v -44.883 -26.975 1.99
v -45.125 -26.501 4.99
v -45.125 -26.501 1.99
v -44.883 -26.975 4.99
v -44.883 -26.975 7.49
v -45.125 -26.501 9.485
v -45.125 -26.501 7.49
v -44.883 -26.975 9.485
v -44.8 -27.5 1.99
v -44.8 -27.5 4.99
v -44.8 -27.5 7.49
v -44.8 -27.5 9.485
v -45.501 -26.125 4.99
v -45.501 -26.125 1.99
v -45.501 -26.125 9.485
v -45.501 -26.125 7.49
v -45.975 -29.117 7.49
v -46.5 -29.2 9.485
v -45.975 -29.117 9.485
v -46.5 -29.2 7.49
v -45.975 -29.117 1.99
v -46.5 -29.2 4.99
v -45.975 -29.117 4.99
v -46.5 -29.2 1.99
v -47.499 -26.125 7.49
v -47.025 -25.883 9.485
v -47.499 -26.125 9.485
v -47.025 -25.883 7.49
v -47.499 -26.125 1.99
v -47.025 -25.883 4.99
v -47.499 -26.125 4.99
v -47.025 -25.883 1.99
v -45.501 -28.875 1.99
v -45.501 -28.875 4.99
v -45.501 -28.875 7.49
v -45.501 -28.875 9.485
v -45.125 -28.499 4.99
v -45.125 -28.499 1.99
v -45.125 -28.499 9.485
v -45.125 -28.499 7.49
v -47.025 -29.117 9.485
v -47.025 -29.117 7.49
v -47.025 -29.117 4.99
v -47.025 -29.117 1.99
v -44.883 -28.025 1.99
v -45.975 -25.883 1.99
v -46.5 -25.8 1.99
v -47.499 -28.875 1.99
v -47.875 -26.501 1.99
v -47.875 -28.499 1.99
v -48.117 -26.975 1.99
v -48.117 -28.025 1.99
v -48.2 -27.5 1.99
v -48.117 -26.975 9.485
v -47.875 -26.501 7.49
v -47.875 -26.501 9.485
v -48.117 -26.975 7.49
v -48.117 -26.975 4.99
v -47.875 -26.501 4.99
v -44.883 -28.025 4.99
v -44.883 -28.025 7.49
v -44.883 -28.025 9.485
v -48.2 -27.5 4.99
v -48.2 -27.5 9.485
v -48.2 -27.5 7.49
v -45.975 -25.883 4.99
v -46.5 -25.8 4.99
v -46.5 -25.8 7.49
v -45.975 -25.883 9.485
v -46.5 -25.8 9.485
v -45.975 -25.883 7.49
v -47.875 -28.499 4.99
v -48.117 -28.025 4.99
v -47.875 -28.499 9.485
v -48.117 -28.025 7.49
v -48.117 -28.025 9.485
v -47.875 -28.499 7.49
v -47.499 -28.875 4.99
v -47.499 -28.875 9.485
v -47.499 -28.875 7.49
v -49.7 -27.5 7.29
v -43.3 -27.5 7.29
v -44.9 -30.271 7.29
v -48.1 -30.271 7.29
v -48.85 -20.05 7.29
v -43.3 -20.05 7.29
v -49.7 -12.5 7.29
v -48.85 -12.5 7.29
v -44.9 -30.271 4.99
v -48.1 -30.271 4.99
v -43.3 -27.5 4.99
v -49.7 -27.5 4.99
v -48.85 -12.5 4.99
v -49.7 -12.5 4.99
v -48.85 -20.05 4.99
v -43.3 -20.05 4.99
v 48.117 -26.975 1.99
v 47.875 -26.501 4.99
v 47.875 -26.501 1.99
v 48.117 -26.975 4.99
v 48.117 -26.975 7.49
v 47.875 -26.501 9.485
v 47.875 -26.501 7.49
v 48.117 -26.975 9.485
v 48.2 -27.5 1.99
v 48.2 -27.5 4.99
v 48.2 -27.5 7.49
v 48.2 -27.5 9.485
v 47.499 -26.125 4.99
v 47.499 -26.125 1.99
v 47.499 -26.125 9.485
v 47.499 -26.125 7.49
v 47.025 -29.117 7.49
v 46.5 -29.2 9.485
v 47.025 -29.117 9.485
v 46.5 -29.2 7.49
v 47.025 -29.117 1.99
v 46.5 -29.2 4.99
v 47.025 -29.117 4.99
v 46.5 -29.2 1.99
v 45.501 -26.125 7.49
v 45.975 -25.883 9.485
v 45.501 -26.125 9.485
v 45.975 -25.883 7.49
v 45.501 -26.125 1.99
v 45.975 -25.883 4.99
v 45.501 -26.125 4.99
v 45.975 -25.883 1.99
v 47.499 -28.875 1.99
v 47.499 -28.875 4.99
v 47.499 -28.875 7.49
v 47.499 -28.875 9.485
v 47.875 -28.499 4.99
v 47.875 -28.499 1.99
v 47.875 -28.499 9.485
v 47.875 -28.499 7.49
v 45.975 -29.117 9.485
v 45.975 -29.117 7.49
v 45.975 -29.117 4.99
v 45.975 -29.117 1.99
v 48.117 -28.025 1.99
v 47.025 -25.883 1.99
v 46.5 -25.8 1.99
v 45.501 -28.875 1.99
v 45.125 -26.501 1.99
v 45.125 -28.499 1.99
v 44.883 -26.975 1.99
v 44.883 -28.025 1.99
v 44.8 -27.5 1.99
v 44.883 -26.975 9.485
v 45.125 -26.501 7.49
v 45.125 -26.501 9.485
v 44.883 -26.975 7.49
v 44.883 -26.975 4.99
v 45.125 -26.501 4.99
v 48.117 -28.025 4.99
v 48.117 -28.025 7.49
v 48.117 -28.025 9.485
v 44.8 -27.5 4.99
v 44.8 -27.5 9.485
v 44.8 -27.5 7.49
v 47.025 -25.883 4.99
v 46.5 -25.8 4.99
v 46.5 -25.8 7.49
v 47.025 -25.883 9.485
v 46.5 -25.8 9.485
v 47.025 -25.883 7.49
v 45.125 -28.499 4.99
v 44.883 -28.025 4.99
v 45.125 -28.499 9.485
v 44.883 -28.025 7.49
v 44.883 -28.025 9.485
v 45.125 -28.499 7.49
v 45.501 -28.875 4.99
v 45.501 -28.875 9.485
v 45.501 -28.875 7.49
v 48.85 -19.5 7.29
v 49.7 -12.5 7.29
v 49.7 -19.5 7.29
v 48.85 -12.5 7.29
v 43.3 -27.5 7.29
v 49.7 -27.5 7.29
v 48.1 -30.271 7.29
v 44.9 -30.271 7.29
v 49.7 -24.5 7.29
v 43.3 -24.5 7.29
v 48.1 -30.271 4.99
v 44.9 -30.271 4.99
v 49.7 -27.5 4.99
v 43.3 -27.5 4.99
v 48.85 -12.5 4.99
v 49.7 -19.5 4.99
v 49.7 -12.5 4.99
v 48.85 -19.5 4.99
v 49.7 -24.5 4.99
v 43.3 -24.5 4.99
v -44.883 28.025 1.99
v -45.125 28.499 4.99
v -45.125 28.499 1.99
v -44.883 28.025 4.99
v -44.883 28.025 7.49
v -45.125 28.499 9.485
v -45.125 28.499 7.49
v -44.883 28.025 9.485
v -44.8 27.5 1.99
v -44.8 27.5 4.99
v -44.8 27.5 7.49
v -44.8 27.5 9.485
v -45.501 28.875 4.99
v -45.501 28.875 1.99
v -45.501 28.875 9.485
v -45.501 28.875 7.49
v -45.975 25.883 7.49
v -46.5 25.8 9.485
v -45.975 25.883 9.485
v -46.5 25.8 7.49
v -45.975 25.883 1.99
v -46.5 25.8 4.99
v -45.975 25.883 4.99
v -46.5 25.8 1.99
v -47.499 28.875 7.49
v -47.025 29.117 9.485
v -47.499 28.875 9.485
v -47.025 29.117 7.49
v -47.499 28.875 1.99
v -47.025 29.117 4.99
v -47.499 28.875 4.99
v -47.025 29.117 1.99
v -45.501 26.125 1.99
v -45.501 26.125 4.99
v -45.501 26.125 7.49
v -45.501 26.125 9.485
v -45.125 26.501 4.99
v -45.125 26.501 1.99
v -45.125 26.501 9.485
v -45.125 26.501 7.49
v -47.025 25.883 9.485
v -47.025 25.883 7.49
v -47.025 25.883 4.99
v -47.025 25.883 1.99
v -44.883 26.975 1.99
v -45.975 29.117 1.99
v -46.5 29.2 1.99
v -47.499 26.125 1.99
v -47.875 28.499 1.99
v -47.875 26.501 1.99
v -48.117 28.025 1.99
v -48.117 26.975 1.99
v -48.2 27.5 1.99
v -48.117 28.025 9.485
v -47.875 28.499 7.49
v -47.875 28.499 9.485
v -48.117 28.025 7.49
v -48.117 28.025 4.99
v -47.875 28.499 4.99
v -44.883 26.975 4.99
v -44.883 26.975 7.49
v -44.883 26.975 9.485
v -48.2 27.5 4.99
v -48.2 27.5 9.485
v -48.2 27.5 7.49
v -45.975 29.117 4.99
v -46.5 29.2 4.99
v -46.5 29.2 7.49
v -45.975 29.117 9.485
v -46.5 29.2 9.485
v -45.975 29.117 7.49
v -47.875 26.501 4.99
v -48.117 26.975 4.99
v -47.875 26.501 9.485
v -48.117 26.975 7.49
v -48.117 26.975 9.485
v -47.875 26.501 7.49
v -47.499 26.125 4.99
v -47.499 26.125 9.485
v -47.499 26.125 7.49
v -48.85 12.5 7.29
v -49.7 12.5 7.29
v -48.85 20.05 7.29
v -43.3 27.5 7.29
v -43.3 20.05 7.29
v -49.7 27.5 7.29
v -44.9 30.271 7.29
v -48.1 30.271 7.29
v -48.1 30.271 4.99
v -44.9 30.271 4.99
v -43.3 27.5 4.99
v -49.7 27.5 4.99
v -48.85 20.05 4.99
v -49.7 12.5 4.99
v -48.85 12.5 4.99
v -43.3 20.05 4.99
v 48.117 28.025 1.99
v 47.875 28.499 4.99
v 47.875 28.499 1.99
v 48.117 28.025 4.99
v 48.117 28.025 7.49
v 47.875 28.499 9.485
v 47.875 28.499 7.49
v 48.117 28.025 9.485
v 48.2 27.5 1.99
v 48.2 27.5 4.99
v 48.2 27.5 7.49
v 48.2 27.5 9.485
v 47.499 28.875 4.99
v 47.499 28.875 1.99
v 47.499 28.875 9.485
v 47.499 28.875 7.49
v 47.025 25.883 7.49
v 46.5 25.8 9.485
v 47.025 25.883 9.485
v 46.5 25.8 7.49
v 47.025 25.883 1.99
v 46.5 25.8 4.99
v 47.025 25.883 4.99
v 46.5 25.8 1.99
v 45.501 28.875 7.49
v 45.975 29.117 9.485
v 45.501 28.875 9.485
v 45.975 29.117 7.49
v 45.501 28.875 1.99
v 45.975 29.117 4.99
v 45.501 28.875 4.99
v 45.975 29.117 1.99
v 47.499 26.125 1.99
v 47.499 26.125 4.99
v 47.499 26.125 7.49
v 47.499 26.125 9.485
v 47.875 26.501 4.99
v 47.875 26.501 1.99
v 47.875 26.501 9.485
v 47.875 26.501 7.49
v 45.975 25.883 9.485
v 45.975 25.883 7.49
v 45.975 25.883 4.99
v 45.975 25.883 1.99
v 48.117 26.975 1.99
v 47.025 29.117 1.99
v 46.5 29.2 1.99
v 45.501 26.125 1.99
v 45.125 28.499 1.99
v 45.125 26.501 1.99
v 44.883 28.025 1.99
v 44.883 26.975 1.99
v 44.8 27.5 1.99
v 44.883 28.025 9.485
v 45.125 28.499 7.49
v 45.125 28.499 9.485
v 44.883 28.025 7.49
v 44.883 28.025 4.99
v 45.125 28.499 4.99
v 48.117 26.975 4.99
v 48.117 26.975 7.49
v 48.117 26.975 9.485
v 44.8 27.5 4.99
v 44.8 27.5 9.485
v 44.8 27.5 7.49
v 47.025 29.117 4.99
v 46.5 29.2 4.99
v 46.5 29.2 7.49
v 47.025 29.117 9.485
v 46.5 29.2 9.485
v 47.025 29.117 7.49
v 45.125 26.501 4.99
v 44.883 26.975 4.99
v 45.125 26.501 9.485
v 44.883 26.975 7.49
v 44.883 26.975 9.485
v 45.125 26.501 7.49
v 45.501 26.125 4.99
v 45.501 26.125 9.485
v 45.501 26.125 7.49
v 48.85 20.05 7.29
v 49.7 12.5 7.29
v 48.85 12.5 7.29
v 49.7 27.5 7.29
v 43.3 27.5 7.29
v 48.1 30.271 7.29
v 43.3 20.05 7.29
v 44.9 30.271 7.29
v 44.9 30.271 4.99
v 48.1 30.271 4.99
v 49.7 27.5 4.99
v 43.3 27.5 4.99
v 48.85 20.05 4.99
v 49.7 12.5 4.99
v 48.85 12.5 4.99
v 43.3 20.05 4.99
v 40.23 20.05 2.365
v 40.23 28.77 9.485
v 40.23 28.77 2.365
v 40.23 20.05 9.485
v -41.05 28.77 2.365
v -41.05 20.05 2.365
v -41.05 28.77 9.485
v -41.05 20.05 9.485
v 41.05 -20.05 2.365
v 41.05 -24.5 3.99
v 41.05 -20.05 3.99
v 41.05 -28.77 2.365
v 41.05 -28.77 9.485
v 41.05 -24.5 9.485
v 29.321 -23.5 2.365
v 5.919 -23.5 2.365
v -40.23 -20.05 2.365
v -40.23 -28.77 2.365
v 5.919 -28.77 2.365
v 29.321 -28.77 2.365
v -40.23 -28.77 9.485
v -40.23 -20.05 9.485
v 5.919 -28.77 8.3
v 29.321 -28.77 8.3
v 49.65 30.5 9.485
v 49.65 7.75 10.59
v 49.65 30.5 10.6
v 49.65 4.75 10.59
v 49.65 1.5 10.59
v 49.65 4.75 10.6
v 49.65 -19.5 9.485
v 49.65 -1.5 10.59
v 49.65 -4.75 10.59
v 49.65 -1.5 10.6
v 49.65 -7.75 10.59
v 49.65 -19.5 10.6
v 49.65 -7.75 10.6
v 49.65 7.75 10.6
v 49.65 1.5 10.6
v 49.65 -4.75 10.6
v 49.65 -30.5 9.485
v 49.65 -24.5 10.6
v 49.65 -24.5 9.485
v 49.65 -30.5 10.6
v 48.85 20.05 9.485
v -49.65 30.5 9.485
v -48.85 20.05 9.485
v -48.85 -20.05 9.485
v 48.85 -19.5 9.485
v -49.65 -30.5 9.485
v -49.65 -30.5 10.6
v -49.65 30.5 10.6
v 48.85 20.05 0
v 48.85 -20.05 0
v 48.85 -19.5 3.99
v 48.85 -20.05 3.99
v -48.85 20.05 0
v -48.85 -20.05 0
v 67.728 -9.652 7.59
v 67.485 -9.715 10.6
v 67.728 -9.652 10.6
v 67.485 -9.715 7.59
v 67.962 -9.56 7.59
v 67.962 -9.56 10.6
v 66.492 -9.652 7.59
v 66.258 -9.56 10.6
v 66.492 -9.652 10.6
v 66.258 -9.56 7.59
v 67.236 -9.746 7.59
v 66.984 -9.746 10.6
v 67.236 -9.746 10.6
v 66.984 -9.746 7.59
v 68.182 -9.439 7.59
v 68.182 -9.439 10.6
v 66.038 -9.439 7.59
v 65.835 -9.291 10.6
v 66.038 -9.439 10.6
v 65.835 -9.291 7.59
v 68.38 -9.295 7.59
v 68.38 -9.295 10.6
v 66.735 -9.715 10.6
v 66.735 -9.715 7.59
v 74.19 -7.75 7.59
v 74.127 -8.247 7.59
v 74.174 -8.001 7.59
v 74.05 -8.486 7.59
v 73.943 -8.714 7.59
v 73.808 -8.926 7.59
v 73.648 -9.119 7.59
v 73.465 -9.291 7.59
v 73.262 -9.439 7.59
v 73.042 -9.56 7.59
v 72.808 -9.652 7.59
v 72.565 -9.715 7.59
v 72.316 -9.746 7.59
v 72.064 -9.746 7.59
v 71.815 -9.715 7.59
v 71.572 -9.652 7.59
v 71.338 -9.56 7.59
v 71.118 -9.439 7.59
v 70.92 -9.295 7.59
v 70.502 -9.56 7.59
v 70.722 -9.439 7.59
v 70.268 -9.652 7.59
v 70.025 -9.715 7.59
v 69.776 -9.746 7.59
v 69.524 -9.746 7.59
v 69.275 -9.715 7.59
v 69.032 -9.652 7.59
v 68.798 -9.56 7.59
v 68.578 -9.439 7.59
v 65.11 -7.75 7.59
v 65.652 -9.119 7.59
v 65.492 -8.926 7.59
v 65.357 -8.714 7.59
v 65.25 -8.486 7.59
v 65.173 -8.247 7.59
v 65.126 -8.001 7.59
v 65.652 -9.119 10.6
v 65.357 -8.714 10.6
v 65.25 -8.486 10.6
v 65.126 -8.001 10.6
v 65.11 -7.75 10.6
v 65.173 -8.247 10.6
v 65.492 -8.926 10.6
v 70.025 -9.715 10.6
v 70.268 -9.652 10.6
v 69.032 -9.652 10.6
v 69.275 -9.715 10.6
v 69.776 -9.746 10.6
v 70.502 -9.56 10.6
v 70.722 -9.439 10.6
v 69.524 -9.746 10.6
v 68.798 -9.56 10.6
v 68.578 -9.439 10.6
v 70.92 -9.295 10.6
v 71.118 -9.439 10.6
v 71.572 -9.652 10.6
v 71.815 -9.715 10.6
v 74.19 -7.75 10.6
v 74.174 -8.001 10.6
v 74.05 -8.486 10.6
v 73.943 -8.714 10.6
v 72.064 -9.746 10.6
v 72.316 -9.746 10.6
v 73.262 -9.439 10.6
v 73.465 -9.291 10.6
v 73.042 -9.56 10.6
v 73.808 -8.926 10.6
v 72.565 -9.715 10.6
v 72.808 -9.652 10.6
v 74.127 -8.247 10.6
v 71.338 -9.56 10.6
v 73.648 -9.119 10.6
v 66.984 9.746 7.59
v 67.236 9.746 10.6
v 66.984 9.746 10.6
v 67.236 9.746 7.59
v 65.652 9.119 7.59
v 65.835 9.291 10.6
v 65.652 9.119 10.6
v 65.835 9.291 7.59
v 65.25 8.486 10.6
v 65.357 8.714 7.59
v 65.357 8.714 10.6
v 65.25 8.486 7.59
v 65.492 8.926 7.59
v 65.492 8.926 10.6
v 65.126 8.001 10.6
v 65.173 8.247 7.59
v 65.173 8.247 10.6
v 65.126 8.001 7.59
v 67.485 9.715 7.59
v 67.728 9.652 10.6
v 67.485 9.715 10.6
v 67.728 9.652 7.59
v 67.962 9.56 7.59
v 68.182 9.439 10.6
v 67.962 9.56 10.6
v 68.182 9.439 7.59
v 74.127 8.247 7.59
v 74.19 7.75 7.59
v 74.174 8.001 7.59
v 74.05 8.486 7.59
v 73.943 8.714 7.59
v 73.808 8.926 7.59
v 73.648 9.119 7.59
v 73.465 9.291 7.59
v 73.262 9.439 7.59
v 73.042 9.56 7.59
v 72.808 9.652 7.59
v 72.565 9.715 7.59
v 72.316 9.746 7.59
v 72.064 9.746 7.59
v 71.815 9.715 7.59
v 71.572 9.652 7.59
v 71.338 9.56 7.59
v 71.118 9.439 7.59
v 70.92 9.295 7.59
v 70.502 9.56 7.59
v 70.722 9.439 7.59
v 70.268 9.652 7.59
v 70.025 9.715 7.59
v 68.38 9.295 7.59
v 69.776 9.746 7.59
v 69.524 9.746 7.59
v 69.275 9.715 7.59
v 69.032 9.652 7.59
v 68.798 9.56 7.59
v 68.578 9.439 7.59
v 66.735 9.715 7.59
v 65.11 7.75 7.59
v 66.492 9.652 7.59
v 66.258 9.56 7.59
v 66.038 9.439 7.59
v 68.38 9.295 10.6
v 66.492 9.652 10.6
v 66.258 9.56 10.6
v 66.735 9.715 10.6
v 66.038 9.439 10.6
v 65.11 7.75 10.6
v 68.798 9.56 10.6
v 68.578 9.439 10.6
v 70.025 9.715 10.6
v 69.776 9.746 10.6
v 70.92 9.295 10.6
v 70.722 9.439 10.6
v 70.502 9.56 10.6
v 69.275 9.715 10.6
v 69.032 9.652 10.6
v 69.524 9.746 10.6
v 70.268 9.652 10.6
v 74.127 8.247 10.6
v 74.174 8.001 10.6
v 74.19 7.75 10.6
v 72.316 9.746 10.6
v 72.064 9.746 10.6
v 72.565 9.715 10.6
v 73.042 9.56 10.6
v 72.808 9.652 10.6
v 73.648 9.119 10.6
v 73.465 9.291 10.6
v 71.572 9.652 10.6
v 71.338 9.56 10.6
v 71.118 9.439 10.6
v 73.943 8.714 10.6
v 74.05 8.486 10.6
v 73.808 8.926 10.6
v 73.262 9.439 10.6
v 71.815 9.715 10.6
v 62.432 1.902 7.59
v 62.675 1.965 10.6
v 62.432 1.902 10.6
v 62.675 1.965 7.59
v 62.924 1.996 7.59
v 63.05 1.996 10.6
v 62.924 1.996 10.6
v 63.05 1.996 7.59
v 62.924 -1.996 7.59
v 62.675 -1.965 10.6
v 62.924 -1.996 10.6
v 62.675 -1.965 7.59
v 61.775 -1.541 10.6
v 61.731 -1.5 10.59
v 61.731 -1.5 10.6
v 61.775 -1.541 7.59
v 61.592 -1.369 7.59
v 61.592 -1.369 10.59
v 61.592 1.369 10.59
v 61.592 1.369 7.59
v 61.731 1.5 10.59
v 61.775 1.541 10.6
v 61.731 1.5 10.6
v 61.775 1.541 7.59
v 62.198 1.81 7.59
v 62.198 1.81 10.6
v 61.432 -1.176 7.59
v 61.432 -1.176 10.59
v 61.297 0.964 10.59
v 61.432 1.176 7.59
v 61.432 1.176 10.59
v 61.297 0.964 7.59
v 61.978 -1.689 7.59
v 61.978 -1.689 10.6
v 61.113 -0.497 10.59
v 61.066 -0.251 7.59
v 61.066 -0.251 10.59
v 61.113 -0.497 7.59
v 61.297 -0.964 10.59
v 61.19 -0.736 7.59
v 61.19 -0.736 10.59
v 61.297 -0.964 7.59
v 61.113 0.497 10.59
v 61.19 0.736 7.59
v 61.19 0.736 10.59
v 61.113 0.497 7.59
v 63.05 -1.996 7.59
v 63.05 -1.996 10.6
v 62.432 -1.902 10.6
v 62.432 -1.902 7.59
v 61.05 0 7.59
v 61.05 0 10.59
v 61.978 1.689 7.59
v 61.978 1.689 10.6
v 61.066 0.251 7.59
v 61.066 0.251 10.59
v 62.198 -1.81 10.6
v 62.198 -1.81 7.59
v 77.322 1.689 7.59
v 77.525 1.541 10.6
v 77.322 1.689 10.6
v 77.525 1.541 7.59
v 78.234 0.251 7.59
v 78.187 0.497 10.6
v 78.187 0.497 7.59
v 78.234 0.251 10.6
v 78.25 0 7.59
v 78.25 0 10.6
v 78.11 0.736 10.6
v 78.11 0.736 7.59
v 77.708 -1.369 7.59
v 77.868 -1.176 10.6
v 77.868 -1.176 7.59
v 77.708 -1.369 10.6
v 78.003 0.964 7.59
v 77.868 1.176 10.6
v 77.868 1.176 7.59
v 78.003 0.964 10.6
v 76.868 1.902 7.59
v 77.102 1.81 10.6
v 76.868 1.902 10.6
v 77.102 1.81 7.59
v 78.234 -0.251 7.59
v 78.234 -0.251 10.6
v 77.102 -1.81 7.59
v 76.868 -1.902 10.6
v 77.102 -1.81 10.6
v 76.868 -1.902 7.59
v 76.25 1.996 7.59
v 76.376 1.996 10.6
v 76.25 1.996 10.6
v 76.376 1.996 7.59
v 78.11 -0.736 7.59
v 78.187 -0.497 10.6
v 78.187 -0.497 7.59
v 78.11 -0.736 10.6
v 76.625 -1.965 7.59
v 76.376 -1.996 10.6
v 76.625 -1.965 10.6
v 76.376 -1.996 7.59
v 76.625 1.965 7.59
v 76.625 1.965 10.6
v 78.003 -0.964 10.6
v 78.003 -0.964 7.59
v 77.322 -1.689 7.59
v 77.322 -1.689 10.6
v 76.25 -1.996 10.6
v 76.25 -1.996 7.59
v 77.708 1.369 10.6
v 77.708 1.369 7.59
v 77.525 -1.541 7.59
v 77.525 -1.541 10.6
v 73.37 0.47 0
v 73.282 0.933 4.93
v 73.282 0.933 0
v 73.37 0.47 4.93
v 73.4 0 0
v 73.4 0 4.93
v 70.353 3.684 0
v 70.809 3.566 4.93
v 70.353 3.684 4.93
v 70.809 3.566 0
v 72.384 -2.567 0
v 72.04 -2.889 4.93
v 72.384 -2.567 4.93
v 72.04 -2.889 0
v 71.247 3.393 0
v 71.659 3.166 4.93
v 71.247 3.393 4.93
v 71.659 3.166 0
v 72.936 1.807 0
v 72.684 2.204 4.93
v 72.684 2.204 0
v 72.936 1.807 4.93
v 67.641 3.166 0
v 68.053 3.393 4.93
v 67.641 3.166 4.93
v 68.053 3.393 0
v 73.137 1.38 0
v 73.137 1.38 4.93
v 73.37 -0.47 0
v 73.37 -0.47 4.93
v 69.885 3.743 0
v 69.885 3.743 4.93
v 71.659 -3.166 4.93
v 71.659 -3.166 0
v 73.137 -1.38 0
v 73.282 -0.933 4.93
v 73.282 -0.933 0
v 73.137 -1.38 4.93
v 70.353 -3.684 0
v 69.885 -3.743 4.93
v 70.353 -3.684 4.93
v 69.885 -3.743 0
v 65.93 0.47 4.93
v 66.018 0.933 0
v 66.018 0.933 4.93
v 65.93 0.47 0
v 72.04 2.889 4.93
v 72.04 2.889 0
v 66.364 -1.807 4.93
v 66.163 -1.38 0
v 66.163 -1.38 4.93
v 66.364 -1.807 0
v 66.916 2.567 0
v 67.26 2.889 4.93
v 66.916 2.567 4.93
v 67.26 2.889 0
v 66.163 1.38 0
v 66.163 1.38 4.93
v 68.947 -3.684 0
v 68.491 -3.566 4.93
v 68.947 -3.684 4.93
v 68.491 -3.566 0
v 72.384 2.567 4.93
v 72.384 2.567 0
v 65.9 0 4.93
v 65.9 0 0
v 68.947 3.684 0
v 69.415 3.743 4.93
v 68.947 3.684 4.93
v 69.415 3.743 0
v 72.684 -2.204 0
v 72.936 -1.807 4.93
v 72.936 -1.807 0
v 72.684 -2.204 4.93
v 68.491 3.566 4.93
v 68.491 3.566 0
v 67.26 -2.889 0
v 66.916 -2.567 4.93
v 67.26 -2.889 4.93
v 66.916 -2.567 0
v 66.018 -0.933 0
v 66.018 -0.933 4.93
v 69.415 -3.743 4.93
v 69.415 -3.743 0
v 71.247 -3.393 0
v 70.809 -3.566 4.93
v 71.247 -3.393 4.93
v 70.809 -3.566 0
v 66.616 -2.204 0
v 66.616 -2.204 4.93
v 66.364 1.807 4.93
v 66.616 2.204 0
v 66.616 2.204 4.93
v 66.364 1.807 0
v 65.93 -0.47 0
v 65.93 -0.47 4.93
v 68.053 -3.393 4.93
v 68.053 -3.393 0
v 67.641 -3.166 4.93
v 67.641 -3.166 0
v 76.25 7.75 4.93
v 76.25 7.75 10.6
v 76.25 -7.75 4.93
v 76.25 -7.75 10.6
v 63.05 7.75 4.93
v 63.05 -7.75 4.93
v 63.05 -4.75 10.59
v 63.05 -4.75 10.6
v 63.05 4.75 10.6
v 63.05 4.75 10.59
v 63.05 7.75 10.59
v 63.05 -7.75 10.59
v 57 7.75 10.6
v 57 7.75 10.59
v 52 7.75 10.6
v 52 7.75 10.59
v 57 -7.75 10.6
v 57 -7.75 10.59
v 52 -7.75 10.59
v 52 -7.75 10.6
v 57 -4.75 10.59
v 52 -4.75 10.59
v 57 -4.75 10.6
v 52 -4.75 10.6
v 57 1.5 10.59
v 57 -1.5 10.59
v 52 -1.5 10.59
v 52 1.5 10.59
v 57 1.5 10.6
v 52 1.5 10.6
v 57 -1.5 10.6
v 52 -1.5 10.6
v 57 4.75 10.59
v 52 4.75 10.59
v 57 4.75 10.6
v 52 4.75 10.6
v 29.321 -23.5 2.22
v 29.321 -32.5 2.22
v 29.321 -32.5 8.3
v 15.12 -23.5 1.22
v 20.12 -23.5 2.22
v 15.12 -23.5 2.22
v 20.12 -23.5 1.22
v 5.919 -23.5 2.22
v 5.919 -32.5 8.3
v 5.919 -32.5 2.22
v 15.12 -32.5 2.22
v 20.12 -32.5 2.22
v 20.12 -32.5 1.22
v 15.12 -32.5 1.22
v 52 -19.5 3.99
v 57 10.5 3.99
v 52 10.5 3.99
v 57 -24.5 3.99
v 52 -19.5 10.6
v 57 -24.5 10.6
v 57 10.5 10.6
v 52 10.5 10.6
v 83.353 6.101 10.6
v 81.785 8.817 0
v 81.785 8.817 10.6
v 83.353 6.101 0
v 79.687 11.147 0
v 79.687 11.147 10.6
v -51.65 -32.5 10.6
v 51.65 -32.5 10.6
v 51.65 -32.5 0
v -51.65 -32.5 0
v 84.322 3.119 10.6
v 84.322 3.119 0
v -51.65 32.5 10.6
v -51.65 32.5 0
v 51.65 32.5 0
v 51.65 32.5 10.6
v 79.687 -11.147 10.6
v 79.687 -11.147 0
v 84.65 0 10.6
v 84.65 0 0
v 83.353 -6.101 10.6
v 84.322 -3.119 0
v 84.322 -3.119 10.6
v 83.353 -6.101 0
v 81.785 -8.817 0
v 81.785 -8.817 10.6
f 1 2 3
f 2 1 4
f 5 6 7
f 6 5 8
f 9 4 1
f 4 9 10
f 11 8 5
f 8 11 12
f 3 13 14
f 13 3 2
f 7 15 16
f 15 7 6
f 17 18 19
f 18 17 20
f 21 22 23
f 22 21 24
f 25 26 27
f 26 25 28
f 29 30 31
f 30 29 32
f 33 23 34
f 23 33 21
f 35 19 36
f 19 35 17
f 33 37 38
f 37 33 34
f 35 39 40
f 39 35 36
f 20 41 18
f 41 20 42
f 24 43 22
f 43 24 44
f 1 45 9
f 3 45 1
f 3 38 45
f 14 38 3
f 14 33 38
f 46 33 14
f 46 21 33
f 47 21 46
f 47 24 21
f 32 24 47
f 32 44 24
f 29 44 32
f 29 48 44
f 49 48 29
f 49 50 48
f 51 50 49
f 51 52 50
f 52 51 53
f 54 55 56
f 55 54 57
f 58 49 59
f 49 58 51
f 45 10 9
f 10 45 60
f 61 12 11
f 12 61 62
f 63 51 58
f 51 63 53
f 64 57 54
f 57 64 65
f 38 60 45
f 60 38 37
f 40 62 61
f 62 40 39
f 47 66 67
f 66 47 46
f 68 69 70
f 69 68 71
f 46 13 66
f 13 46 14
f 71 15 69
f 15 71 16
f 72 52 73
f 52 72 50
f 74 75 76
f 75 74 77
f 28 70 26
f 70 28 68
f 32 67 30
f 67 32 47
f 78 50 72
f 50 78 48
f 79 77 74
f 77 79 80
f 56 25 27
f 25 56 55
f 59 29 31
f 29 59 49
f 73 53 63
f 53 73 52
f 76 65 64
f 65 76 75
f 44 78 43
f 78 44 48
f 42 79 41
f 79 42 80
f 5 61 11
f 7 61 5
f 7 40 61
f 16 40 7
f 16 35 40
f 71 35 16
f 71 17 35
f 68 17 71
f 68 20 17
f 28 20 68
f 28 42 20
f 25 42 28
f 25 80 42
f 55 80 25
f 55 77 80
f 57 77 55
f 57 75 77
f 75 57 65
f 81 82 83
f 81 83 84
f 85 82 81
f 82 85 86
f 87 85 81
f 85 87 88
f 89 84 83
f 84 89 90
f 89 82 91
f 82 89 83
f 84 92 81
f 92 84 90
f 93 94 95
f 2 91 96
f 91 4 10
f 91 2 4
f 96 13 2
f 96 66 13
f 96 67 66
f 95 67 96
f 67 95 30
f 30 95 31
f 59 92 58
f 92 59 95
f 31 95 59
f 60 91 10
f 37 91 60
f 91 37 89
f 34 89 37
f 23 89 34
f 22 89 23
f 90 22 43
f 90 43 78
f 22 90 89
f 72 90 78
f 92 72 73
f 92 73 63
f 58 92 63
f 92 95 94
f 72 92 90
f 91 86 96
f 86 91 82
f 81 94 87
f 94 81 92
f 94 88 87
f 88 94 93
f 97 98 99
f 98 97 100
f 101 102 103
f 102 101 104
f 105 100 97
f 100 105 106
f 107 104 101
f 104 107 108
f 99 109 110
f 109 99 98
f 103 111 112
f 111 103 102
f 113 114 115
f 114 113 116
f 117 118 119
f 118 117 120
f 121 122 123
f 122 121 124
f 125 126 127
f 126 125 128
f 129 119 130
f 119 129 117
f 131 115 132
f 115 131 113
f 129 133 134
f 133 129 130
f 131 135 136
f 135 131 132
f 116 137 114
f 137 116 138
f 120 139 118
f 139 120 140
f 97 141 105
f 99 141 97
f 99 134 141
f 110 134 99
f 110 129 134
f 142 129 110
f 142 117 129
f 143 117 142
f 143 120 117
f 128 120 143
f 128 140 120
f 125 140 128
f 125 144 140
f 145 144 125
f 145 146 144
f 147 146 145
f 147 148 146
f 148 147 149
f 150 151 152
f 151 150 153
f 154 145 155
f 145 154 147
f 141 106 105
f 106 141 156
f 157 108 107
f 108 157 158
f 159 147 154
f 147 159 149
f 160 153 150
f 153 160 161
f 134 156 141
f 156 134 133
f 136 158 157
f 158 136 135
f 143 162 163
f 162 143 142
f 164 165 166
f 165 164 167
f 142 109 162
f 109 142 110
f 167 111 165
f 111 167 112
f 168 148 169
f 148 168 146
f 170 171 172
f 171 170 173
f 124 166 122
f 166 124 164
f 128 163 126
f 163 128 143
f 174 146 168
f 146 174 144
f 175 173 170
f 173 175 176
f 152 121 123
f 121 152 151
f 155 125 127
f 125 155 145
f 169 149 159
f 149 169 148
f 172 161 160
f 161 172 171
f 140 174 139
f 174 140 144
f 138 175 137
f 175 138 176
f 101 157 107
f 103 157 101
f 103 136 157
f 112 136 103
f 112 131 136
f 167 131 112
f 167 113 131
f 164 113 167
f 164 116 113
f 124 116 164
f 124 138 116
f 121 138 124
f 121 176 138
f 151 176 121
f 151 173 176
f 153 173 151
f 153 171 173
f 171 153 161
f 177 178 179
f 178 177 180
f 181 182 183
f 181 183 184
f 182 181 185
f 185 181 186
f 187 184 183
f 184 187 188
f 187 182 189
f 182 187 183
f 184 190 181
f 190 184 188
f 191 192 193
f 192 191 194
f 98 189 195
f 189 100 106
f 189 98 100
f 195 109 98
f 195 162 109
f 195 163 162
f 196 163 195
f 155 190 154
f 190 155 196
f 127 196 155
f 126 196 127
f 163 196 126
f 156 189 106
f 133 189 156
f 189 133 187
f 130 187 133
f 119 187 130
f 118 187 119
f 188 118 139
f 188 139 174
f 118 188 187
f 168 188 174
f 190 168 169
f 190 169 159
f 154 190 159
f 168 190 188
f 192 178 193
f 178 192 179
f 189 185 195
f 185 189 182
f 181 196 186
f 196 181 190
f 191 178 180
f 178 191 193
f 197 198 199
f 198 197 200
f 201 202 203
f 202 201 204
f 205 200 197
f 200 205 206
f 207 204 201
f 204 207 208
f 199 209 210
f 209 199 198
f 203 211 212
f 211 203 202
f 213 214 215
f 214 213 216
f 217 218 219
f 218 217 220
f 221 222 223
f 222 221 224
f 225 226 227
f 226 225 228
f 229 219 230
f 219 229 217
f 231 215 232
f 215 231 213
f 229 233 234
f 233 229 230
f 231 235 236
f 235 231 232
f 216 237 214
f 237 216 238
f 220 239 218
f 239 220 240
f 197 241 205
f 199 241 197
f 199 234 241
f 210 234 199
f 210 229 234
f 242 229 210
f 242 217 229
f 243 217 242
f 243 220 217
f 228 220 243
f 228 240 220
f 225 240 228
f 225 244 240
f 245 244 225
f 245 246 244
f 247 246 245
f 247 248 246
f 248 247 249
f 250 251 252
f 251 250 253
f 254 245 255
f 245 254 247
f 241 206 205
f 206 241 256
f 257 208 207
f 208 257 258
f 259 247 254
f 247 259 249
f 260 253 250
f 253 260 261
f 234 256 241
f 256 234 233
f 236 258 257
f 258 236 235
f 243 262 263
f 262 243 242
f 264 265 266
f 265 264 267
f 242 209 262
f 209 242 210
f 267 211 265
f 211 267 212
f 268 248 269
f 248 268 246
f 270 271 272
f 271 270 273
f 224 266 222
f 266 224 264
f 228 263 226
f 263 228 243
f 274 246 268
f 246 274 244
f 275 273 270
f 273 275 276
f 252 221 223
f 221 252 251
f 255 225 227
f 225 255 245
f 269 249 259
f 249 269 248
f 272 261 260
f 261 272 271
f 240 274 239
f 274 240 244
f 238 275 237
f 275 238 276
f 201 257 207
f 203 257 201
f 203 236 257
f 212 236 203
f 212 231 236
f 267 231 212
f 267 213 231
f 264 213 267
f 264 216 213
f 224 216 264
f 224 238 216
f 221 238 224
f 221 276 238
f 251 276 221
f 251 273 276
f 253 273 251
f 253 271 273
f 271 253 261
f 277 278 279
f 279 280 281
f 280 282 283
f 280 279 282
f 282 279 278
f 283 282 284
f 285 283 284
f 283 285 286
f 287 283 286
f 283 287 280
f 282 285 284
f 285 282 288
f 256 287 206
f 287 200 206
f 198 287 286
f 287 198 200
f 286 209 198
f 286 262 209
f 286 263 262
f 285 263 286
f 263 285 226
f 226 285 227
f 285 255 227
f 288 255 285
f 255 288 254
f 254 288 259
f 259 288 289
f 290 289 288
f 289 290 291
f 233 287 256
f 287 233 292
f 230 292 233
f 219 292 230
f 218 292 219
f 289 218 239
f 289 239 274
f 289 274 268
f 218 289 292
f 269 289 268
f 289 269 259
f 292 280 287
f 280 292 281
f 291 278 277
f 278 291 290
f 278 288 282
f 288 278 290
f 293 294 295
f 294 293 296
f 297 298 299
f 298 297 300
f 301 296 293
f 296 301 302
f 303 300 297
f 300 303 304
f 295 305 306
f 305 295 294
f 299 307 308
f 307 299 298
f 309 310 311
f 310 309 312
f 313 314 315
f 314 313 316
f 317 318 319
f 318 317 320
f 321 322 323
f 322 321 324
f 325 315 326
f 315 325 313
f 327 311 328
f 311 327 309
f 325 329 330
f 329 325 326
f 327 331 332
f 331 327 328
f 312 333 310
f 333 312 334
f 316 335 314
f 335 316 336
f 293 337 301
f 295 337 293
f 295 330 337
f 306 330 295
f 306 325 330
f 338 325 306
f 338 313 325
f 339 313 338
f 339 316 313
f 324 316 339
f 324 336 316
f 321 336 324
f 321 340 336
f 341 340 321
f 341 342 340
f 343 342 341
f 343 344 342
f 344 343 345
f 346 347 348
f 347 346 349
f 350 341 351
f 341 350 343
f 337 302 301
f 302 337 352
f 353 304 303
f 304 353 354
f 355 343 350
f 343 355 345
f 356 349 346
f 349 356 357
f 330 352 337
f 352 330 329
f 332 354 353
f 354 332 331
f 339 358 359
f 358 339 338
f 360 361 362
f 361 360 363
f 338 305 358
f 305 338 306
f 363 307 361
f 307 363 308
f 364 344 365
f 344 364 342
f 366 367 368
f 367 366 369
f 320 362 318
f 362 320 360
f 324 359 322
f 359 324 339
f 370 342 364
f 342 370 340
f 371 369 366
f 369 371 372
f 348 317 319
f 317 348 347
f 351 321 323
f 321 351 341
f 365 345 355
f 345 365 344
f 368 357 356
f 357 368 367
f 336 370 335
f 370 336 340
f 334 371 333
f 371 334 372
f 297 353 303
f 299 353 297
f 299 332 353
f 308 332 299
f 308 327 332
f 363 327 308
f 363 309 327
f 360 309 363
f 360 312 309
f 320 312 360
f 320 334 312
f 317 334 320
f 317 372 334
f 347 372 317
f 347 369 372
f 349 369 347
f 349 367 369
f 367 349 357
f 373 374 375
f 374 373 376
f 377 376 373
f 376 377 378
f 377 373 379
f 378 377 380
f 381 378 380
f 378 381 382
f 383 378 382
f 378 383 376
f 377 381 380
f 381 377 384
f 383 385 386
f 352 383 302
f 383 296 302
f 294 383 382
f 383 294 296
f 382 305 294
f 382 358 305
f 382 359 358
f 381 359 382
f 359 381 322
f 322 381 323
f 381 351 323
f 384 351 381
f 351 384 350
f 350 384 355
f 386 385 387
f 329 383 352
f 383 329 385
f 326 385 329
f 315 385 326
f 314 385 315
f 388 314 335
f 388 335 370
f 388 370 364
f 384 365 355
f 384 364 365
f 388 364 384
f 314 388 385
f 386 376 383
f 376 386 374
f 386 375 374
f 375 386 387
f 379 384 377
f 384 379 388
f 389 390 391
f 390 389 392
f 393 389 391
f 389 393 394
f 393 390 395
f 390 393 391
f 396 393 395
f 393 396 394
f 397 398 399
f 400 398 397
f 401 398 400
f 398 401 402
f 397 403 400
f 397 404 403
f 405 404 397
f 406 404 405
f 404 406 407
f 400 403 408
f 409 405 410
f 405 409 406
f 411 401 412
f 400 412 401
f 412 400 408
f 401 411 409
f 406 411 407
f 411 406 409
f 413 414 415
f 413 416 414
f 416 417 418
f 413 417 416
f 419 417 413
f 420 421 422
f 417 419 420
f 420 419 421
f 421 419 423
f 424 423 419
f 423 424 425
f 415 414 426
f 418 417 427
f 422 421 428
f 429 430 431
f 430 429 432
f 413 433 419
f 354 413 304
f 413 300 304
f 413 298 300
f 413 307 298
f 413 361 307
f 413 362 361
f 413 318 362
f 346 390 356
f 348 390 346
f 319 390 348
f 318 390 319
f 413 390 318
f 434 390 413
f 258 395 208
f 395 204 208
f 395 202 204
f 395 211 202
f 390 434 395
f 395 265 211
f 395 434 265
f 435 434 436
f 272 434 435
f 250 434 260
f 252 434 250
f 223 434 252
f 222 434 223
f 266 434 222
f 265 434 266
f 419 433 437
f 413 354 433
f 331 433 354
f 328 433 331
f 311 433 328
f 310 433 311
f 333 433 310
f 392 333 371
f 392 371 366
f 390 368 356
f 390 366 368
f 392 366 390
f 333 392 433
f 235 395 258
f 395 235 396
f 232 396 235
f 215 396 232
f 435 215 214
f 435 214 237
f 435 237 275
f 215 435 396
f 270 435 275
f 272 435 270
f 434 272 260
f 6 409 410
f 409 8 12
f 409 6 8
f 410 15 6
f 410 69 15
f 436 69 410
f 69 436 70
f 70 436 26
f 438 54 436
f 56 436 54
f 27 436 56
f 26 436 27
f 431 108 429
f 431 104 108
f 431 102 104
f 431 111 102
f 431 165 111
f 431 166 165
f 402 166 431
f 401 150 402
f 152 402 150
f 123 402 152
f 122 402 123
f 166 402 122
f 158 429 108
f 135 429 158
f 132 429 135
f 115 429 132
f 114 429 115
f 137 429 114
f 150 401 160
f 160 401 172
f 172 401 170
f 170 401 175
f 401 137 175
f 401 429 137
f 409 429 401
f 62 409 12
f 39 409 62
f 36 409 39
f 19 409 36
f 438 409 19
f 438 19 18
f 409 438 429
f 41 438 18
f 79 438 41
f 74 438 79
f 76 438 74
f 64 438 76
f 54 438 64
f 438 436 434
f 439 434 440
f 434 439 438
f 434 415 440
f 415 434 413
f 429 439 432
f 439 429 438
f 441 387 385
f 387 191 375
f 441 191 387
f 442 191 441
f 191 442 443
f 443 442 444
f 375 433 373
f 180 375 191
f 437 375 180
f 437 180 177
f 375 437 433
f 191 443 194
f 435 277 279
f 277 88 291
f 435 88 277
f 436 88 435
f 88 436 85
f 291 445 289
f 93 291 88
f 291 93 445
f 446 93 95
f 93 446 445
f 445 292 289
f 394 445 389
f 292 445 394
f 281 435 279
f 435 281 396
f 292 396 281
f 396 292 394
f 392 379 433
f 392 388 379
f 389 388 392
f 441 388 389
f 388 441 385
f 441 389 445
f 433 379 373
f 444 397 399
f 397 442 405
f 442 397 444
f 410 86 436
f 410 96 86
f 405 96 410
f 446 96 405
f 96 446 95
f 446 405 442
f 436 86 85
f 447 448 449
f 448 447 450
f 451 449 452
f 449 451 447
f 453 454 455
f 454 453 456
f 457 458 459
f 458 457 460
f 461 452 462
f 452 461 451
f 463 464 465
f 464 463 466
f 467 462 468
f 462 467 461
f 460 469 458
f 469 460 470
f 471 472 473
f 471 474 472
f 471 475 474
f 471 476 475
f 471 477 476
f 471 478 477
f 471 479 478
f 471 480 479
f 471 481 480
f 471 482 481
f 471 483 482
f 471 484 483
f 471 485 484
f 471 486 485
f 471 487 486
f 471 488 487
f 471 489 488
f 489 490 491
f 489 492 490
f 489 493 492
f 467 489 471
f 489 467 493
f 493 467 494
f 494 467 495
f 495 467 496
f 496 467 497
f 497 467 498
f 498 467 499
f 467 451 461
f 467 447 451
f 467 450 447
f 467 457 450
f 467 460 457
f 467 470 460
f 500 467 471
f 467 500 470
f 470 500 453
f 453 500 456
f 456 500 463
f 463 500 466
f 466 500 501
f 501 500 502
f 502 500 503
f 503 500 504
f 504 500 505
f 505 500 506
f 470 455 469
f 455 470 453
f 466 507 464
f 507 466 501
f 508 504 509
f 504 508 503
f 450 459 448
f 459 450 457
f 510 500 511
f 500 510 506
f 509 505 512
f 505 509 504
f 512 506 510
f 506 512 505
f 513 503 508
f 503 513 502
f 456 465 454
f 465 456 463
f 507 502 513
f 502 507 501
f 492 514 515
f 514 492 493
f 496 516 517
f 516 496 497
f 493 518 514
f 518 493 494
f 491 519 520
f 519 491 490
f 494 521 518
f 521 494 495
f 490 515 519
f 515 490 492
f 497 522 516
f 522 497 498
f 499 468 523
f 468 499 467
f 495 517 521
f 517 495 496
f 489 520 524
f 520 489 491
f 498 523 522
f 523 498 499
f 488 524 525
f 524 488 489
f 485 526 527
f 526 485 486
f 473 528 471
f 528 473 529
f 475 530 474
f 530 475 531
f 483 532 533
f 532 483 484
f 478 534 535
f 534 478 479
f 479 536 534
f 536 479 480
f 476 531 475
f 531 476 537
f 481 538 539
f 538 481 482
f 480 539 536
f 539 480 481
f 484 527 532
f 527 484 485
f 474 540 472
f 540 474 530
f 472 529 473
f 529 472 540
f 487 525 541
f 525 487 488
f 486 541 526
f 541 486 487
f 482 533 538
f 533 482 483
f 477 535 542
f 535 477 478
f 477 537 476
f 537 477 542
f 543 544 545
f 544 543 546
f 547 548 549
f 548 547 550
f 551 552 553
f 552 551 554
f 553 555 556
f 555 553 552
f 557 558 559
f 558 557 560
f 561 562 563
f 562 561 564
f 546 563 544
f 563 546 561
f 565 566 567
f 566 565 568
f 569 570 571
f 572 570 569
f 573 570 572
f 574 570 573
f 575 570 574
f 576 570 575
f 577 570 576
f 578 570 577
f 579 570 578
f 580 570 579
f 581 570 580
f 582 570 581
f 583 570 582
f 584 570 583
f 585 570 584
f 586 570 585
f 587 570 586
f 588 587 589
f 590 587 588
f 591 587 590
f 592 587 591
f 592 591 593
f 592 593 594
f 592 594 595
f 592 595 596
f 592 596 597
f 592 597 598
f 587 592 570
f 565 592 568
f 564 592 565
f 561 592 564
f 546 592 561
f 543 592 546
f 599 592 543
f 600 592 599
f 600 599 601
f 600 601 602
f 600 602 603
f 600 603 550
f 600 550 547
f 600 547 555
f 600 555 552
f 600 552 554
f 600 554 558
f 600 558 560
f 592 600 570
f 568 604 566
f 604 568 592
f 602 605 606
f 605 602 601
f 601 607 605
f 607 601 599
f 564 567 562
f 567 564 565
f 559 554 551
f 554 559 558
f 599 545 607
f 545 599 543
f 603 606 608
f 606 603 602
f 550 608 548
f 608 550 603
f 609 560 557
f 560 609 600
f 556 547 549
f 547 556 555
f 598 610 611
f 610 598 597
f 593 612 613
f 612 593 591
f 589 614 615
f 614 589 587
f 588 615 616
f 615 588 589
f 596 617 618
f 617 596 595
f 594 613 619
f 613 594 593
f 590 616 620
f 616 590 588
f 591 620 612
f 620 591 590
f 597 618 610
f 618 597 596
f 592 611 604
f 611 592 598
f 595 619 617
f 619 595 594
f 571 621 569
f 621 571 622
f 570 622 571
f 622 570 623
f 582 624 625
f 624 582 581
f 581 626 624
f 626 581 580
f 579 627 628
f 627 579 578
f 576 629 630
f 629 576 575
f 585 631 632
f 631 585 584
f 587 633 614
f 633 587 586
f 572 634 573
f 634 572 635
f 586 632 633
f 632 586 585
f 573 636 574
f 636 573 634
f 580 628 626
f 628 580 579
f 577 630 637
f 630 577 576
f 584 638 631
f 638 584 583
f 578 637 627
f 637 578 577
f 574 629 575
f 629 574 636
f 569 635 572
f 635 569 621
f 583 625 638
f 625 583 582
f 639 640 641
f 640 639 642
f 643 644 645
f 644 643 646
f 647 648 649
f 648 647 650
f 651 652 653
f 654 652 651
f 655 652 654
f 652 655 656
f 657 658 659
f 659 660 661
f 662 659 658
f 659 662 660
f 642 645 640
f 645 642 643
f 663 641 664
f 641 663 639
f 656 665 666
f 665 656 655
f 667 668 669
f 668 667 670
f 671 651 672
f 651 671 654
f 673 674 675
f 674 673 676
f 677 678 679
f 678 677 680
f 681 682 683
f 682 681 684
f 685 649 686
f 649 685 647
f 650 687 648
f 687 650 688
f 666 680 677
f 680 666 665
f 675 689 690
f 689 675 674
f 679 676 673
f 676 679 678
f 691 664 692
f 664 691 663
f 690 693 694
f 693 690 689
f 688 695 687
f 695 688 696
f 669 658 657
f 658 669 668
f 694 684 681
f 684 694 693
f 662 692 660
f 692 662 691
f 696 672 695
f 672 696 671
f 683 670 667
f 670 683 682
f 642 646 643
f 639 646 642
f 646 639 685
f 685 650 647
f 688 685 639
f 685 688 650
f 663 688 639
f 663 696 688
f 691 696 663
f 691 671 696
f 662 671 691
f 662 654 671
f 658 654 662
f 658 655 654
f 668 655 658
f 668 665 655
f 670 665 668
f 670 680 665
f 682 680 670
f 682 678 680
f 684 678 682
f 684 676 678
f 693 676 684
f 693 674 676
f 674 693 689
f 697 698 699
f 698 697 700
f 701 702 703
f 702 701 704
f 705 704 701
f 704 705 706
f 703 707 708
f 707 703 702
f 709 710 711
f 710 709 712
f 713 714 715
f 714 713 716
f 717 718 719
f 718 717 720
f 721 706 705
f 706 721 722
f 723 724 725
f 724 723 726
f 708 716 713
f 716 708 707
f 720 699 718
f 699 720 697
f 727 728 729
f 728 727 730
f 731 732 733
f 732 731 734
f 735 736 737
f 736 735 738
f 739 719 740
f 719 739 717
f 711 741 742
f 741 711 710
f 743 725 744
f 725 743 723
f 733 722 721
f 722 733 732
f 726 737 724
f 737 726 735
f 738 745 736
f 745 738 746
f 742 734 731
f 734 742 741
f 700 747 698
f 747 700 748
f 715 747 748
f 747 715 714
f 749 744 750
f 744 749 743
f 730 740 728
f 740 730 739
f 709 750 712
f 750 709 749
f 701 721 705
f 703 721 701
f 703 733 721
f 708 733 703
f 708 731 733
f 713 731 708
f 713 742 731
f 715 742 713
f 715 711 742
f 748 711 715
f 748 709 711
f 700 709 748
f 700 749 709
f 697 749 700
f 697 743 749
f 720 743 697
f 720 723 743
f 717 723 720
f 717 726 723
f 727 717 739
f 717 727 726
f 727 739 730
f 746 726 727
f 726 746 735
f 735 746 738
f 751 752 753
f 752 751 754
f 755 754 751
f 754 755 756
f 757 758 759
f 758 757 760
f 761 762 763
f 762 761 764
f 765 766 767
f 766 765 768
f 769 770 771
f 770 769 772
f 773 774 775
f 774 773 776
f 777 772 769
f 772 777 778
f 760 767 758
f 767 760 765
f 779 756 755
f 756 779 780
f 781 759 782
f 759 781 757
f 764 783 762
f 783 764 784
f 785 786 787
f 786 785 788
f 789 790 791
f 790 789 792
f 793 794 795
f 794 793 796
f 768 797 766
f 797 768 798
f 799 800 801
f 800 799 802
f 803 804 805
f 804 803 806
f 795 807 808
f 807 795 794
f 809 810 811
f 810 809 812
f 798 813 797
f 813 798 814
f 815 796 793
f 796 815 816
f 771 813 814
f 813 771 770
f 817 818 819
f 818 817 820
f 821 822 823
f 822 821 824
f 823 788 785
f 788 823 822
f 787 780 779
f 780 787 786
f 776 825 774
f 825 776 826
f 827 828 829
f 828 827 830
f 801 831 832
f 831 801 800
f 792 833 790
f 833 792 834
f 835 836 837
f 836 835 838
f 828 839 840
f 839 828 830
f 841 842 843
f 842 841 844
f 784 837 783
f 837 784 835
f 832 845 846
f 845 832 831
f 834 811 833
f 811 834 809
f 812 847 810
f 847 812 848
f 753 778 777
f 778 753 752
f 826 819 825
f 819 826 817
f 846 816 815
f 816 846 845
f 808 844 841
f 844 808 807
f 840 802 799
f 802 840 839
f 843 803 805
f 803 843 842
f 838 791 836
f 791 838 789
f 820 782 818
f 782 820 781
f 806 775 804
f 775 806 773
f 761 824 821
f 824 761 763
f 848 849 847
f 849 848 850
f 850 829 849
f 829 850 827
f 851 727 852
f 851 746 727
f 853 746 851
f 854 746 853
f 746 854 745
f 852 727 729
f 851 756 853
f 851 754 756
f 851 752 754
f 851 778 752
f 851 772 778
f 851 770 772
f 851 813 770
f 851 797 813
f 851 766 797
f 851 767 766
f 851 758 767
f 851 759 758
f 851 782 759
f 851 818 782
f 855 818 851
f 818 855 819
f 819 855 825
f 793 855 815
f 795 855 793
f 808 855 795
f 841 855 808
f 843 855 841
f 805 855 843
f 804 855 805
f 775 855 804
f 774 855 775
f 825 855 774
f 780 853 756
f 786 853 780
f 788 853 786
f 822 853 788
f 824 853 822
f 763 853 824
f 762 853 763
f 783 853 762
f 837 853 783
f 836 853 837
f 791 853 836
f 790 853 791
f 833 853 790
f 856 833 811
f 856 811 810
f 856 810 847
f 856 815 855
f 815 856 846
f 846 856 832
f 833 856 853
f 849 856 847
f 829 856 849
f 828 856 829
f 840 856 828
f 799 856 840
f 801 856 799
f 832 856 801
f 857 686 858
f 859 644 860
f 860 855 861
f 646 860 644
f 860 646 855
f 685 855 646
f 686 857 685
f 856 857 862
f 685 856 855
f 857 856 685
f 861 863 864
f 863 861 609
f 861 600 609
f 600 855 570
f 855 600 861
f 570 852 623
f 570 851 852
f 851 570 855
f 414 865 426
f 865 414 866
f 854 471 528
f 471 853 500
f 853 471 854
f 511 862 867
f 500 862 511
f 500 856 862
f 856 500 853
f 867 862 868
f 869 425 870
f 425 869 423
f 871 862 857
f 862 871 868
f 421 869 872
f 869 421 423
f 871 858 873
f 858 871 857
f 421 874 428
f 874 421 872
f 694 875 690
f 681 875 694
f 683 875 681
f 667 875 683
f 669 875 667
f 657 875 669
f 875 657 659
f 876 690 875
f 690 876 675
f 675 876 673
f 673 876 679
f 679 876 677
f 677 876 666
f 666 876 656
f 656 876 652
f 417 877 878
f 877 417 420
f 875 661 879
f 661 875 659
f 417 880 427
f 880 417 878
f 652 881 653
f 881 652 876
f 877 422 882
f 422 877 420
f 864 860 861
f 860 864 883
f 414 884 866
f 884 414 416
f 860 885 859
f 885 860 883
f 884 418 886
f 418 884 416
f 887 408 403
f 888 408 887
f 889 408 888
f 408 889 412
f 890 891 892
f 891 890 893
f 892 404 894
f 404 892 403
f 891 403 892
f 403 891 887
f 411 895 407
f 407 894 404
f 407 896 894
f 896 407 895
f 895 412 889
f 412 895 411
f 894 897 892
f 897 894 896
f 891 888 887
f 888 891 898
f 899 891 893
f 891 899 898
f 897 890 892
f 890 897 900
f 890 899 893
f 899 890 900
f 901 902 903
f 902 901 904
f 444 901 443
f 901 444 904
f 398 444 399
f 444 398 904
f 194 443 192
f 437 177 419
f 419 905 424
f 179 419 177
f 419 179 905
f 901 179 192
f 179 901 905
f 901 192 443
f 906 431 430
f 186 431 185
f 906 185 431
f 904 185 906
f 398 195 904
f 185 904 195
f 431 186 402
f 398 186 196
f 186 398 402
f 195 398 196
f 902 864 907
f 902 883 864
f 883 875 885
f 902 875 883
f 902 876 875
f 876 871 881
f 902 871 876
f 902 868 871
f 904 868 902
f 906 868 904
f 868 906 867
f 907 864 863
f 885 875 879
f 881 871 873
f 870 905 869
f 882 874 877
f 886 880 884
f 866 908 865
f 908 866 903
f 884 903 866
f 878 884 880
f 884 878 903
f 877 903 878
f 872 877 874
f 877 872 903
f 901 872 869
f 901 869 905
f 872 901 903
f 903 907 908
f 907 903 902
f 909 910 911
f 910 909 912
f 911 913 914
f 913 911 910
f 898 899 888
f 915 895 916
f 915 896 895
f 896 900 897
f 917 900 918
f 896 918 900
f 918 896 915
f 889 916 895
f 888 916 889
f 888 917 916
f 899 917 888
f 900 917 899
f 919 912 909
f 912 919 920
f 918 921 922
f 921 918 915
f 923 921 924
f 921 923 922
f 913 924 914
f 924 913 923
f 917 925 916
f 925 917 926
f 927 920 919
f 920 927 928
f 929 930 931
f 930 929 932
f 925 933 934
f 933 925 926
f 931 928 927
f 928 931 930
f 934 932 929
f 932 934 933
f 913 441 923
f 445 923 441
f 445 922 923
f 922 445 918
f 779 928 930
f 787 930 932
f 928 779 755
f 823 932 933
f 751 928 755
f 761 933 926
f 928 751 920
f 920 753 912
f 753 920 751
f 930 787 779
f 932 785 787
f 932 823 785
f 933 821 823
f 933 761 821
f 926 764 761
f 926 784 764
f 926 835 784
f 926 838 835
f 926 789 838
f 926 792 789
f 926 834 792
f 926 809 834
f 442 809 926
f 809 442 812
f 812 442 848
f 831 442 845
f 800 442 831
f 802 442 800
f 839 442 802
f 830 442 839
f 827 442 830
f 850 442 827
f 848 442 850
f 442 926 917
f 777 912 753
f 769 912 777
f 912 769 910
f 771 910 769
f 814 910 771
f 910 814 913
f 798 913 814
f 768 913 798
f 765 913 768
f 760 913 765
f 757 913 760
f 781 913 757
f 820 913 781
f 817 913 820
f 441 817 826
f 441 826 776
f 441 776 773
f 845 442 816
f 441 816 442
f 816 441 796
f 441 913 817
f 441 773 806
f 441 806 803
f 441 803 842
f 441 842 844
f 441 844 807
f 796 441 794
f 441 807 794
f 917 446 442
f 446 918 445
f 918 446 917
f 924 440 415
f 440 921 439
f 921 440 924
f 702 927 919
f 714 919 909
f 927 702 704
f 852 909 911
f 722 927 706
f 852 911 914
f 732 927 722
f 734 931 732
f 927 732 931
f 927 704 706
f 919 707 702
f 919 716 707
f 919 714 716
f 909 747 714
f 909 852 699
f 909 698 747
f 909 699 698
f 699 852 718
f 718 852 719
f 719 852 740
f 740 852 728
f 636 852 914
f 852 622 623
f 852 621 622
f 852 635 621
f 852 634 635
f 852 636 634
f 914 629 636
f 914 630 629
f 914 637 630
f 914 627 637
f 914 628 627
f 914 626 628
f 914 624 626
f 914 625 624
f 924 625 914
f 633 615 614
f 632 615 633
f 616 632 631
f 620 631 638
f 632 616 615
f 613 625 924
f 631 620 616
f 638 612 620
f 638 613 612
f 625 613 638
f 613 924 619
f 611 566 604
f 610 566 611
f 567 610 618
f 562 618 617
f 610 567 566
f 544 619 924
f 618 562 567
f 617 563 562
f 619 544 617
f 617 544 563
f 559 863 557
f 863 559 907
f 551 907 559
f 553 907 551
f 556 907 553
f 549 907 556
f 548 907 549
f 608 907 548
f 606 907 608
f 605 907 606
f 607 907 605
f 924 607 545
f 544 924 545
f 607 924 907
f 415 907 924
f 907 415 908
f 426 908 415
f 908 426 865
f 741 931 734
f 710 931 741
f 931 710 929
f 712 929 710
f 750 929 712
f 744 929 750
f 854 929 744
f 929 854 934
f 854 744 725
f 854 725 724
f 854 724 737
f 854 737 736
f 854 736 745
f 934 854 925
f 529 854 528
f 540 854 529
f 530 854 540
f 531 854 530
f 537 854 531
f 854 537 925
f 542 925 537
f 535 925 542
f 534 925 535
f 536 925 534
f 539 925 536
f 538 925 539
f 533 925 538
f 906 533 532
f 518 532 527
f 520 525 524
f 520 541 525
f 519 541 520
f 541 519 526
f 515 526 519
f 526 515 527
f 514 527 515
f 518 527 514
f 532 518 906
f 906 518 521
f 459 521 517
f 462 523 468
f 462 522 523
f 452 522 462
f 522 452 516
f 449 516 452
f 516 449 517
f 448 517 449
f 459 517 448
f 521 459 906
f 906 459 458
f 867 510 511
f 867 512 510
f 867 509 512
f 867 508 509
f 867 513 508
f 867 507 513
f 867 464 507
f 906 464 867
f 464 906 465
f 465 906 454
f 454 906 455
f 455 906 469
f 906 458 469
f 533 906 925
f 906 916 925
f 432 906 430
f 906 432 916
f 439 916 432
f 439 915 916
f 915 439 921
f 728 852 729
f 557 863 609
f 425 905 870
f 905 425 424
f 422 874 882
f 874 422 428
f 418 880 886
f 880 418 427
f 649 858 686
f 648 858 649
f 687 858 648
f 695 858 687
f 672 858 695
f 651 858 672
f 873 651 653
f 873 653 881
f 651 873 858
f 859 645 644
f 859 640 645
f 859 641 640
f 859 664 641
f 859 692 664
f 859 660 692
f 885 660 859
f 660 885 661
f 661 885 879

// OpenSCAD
// file: ClickEncoder.scad
encoderHull();

$fn = 50;

encX	= 12.7	+0.5;
encY	= 15	+0.5;
encZ	= 6.6;
tipDia	= 6;
tipCut	= 4.5;
tipLen	= 7;
rodDia	= 7		+0.5;
rodLen	= 6		-1;
pinH	= 7.2	+1;
pinD	= 2		+2;
pinOff	= 4;
pinZ	= rodLen+encZ-pinOff;

function encoderX() = encX;
function encoderY() = encY;
function encoderZ() = encZ+rodLen+pinH-pinOff;


module encoderHull()
{
	cylinder(r=rodDia/2, h=rodLen+1, center=false);

	translate([0, 0, -tipLen])
	difference()
	{
		cylinder(r=tipDia/2, h=tipLen+1, center=false);

		rotate([0, 0, -70])
		translate([tipDia/2-tipCut, tipDia, -1])
		rotate([0, 0, 180])
		cube([2*tipDia, 2*tipDia, tipLen+1]);
	}

	translate([0, 0, rodLen+encZ/2-0.01])
	cube([encX, encY, encZ+0.1], center = true);

	for (iy=[-1, 1])
	{
		for (ix=[-1, 0, 1])
		{
			translate([ix*2.54, iy*encY/2, pinZ])
			cylinder(r=pinD/2, h=pinH, center=false);
		}
	}

	for (ix=[-1, 1])
	{
		translate([ix*encX/2, 0, pinZ])
		cylinder(r=pinD/2, h=pinH, center=false);
	}
}
// file: Lcd4x20.scad
//lcdPanel();

lcdHull();


lcdPcbX			= 98.3	+1;
lcdPcbY			= 60.0	+1;
lcdPcbZ			=  1.6	+0.5;

lcdFrameX		= 97.2	+0.5;
lcdFrameY		= 39.6	+0.5;
lcdFrameZ		=  9.5;

lcdHoleX		= 93.0;
lcdHoleY		= 55.0;
lcdHoleDia		=  3.4;

lcdWindowX		= 76.0;
lcdWindowY		= 26.0;

lcdRearY		= 45.0;
lcdRearZ		=  2.5;

lcdPinOffset	=  5;
lcdPinDia		=  1;
lcdPins			= 16;

lcdNutDia		= 6.4;//	+0.5;
lcdNutH			= 2.3;//	+0.5;

holesupport	= 0.2;


function lcdX() = lcdPcbX;
function lcdY() = lcdPcbY;
function lcdZ() = lcdFrameZ+lcdPcbZ+lcdRearZ;
function lcdRearZ() = lcdRearZ;
function lcdFramePcb() = lcdFrameZ+lcdPcbZ;
function lcdFrame() = lcdFrameZ;
function lcdPcb() = lcdPcbZ;

module lcdReserved()
{
	translate([0, 0, lcdFrameZ+lcdPcbZ+lcdRearZ/2])
	cube([lcdFrameX, lcdRearY, lcdRearZ+0.01], center=true);

	for (i=[0, 1])
	{
		rotate([0, 0, 180]*i)
		translate([lcdHoleX/2-lcdPinOffset-1.27, lcdHoleY/2+1.27, lcdFrameZ/4])
		rotate([0, 0, 180])
		cube([2*lcdPins*2.54, 15, lcdFrameZ/1.5+lcdPcbZ+lcdRearZ]);
	}
}


module lcdPcb()
{
	translate([0, 0, lcdFrameZ+lcdPcbZ/2])
	cube([lcdPcbX, lcdPcbY, lcdPcbZ+0.01], center=true);
}


module lcdFrame()
{
	translate([0, 0, lcdFrameZ/2])
	cube([lcdFrameX, lcdFrameY, lcdFrameZ+0.01], center=true);
}


module lcdHoles()
{
	for (iy=[-1, 1])
	{
		for (ix=[-1, 1])
		{
			translate([ix*lcdHoleX/2, iy*lcdHoleY/2, 2])
			{
				difference()
				{
					cylinder(r=lcdHoleDia/2, h=(lcdRearZ+lcdPcbZ+lcdFrameZ)*2, $fn=20);
					translate([0, 0, 3+lcdNutH])
					cylinder(r=lcdHoleDia , h=holesupport, center=false);
				}

				translate([0, 0, 3])
				{
					cylinder(r=lcdNutDia/2, h=lcdNutH, $fn=6);

					rotate([0, 0, 90])
					rotate([0, 0, 90]*iy)
					translate([-lcdNutDia/2, 0, 0])
					cube([lcdNutDia/2*2, 15, lcdNutH]);
				}
			}
		}
	}
}


module lcdWindow()
{
	translate([-lcdWindowX/2, -lcdWindowY/2, 1-100])
	cube([lcdWindowX, lcdWindowY, 100]);
}


module lcdPins()
{
	for (i=[1: 1: lcdPins])
	{
		translate([lcdHoleX/2-lcdPinOffset-i*2.54, lcdHoleY/2, lcdFrameZ+lcdPcbZ/2])
		cylinder(r=lcdPinDia/2, h=lcdPcbZ*3, center=true, $fn=10);
	}
}


module lcdLowerNuts(offZ)
{
	for (iy=[-1, 1])
	{
		for (ix=[-1, 1])
		{
			translate([ix*lcdHoleX/2, iy*lcdHoleY/2, offZ-lcdNutH])
			cylinder(r=lcdNutDia/2, h=lcdNutH, $fn=20);
		}
	}
}

module lcdPanel()
{
	difference()
	{
		union()
		{
			lcdPcb();

			lcdFrame();
		}

		lcdHoles();

		lcdPins();
	}
}


module lcdHull()
{
	lcdPcb();

	lcdFrame();

	lcdHoles();

	lcdReserved();

	lcdWindow();
}
// main file
use <Lcd4x20.scad>
use <ClickEncoder.scad>



front();

//rear();

//explodedView();

//panelHull();



buttonDist	= 20;
buttonDia	= 15;
wall		= 2;
boxZ		= wall+max(lcdZ(),encoderZ()-wall+1);
cutOffset	= 1;
boxCutZ		= lcdFramePcb()-cutOffset;
wireTray	= 3;
wireWidth	= 14	*1.27;
wireHeight	= 1;

//Pin
module pin(pinwidth, pinlength)
{
	translate([-pinwidth/2, -pinwidth/2, 0])
	cube([pinwidth, pinwidth, pinlength]);
}


//IDC pin header
module IDC(xpins, ypins)
{
plugsxyadd	= 0.5;
grid		= 0.254;	//how many millimeters goes to ten mils (10 mil = 0.01 inch)
plugsz		= 20;

	//outline
	translate([-5*grid-9.1*grid-plugsxyadd, -5*grid-plugsxyadd, 0])
	cube([10*grid*xpins+18.2*grid+2*plugsxyadd, 10*grid*ypins+2*plugsxyadd, plugsz]);

	translate([(xpins-1)*5*grid, -5*grid, plugsz/2])
	cube([4+2*plugsxyadd, 2+2*plugsxyadd, plugsz], center=true);

	translate([(xpins-1)*5*grid, -5*grid, plugsz/2+7])
	cube([10*grid*xpins+2*plugsxyadd, 2+2*plugsxyadd, plugsz-14], center=true);

	//pins
	for(ix=[0:1:xpins-1])
	for(iy=[0:1:ypins-1])
	translate([10*grid*ix, 10*grid*iy, -3])
	pin(0.6, 11);

}


module panelHull()
{
	difference()
	{
		hull()
		{
			translate([0, 0, boxZ/2])
			cube([lcdX()+2*wall, lcdY()+2*wall, boxZ], center=true);

			translate([lcdX()/2+buttonDist, 0, boxZ/2])
			cylinder(r=buttonDia, h=boxZ, center=true);
		}

		translate([0, 0, -0.01])
		union()
		{
			lcdHull();

			//encoder and wire trays
			translate([lcdX()/2+buttonDist, 0, 0])
			{
				encoderHull();
				for (iy=[-1, 0, 1])
				{
					//encoder wire trays
					translate([(encoderX()-(buttonDist+10))/2, iy*(encoderY()-wireTray)/2, boxCutZ+lcdRearZ()/2+cutOffset/2])
					cube([buttonDist+10, wireTray, lcdRearZ()+cutOffset], center=true);
				}
			}

			//old ext. wire hole
//			translate([-lcdX()/2-wall-1, -wireWidth/2, lcdZ()-wireHeight])
//			cube([10+wall, wireWidth, wireHeight]);

			//IDC pin header
			translate([10, -lcdY()/2+7, 4])
			rotate([90, 0, 0])
			IDC(7, 2);

			//wire duct
			translate([39, -lcdY()/2+6, 4])
			cube([15, 5, 10]);
			translate([52, -lcdY()/2+6, 4])
			cube([5, 35, 10]);
		}

		lcdLowerNuts(boxZ+0.01);
	}
}

module front()
{
	difference()
	{
		panelHull();

		//cut away the rear
		translate([0, 0, boxZ/2+boxCutZ])
		cube([200, 200, boxZ], center=true);
	}
}

module rear()
{
	translate([0, 0, boxZ])
	rotate([0, 180, 0])
	difference()
	{
		panelHull();

		//cut away the front
		translate([0, 0, boxCutZ-boxZ/2])
		cube([200, 200, boxZ], center=true);
	}
}

module explodedView()
{
	rear();

%	translate([0, 0, 30])
	rotate([180, 0, 0])
	lcdPanel();

%	translate([-(lcdX()/2+buttonDist), 0, 30])
	rotate([180, 0, 0])
	encoderHull();

	translate([0, 0, 50])
	rotate([0, 180, 0])
	front();
}
